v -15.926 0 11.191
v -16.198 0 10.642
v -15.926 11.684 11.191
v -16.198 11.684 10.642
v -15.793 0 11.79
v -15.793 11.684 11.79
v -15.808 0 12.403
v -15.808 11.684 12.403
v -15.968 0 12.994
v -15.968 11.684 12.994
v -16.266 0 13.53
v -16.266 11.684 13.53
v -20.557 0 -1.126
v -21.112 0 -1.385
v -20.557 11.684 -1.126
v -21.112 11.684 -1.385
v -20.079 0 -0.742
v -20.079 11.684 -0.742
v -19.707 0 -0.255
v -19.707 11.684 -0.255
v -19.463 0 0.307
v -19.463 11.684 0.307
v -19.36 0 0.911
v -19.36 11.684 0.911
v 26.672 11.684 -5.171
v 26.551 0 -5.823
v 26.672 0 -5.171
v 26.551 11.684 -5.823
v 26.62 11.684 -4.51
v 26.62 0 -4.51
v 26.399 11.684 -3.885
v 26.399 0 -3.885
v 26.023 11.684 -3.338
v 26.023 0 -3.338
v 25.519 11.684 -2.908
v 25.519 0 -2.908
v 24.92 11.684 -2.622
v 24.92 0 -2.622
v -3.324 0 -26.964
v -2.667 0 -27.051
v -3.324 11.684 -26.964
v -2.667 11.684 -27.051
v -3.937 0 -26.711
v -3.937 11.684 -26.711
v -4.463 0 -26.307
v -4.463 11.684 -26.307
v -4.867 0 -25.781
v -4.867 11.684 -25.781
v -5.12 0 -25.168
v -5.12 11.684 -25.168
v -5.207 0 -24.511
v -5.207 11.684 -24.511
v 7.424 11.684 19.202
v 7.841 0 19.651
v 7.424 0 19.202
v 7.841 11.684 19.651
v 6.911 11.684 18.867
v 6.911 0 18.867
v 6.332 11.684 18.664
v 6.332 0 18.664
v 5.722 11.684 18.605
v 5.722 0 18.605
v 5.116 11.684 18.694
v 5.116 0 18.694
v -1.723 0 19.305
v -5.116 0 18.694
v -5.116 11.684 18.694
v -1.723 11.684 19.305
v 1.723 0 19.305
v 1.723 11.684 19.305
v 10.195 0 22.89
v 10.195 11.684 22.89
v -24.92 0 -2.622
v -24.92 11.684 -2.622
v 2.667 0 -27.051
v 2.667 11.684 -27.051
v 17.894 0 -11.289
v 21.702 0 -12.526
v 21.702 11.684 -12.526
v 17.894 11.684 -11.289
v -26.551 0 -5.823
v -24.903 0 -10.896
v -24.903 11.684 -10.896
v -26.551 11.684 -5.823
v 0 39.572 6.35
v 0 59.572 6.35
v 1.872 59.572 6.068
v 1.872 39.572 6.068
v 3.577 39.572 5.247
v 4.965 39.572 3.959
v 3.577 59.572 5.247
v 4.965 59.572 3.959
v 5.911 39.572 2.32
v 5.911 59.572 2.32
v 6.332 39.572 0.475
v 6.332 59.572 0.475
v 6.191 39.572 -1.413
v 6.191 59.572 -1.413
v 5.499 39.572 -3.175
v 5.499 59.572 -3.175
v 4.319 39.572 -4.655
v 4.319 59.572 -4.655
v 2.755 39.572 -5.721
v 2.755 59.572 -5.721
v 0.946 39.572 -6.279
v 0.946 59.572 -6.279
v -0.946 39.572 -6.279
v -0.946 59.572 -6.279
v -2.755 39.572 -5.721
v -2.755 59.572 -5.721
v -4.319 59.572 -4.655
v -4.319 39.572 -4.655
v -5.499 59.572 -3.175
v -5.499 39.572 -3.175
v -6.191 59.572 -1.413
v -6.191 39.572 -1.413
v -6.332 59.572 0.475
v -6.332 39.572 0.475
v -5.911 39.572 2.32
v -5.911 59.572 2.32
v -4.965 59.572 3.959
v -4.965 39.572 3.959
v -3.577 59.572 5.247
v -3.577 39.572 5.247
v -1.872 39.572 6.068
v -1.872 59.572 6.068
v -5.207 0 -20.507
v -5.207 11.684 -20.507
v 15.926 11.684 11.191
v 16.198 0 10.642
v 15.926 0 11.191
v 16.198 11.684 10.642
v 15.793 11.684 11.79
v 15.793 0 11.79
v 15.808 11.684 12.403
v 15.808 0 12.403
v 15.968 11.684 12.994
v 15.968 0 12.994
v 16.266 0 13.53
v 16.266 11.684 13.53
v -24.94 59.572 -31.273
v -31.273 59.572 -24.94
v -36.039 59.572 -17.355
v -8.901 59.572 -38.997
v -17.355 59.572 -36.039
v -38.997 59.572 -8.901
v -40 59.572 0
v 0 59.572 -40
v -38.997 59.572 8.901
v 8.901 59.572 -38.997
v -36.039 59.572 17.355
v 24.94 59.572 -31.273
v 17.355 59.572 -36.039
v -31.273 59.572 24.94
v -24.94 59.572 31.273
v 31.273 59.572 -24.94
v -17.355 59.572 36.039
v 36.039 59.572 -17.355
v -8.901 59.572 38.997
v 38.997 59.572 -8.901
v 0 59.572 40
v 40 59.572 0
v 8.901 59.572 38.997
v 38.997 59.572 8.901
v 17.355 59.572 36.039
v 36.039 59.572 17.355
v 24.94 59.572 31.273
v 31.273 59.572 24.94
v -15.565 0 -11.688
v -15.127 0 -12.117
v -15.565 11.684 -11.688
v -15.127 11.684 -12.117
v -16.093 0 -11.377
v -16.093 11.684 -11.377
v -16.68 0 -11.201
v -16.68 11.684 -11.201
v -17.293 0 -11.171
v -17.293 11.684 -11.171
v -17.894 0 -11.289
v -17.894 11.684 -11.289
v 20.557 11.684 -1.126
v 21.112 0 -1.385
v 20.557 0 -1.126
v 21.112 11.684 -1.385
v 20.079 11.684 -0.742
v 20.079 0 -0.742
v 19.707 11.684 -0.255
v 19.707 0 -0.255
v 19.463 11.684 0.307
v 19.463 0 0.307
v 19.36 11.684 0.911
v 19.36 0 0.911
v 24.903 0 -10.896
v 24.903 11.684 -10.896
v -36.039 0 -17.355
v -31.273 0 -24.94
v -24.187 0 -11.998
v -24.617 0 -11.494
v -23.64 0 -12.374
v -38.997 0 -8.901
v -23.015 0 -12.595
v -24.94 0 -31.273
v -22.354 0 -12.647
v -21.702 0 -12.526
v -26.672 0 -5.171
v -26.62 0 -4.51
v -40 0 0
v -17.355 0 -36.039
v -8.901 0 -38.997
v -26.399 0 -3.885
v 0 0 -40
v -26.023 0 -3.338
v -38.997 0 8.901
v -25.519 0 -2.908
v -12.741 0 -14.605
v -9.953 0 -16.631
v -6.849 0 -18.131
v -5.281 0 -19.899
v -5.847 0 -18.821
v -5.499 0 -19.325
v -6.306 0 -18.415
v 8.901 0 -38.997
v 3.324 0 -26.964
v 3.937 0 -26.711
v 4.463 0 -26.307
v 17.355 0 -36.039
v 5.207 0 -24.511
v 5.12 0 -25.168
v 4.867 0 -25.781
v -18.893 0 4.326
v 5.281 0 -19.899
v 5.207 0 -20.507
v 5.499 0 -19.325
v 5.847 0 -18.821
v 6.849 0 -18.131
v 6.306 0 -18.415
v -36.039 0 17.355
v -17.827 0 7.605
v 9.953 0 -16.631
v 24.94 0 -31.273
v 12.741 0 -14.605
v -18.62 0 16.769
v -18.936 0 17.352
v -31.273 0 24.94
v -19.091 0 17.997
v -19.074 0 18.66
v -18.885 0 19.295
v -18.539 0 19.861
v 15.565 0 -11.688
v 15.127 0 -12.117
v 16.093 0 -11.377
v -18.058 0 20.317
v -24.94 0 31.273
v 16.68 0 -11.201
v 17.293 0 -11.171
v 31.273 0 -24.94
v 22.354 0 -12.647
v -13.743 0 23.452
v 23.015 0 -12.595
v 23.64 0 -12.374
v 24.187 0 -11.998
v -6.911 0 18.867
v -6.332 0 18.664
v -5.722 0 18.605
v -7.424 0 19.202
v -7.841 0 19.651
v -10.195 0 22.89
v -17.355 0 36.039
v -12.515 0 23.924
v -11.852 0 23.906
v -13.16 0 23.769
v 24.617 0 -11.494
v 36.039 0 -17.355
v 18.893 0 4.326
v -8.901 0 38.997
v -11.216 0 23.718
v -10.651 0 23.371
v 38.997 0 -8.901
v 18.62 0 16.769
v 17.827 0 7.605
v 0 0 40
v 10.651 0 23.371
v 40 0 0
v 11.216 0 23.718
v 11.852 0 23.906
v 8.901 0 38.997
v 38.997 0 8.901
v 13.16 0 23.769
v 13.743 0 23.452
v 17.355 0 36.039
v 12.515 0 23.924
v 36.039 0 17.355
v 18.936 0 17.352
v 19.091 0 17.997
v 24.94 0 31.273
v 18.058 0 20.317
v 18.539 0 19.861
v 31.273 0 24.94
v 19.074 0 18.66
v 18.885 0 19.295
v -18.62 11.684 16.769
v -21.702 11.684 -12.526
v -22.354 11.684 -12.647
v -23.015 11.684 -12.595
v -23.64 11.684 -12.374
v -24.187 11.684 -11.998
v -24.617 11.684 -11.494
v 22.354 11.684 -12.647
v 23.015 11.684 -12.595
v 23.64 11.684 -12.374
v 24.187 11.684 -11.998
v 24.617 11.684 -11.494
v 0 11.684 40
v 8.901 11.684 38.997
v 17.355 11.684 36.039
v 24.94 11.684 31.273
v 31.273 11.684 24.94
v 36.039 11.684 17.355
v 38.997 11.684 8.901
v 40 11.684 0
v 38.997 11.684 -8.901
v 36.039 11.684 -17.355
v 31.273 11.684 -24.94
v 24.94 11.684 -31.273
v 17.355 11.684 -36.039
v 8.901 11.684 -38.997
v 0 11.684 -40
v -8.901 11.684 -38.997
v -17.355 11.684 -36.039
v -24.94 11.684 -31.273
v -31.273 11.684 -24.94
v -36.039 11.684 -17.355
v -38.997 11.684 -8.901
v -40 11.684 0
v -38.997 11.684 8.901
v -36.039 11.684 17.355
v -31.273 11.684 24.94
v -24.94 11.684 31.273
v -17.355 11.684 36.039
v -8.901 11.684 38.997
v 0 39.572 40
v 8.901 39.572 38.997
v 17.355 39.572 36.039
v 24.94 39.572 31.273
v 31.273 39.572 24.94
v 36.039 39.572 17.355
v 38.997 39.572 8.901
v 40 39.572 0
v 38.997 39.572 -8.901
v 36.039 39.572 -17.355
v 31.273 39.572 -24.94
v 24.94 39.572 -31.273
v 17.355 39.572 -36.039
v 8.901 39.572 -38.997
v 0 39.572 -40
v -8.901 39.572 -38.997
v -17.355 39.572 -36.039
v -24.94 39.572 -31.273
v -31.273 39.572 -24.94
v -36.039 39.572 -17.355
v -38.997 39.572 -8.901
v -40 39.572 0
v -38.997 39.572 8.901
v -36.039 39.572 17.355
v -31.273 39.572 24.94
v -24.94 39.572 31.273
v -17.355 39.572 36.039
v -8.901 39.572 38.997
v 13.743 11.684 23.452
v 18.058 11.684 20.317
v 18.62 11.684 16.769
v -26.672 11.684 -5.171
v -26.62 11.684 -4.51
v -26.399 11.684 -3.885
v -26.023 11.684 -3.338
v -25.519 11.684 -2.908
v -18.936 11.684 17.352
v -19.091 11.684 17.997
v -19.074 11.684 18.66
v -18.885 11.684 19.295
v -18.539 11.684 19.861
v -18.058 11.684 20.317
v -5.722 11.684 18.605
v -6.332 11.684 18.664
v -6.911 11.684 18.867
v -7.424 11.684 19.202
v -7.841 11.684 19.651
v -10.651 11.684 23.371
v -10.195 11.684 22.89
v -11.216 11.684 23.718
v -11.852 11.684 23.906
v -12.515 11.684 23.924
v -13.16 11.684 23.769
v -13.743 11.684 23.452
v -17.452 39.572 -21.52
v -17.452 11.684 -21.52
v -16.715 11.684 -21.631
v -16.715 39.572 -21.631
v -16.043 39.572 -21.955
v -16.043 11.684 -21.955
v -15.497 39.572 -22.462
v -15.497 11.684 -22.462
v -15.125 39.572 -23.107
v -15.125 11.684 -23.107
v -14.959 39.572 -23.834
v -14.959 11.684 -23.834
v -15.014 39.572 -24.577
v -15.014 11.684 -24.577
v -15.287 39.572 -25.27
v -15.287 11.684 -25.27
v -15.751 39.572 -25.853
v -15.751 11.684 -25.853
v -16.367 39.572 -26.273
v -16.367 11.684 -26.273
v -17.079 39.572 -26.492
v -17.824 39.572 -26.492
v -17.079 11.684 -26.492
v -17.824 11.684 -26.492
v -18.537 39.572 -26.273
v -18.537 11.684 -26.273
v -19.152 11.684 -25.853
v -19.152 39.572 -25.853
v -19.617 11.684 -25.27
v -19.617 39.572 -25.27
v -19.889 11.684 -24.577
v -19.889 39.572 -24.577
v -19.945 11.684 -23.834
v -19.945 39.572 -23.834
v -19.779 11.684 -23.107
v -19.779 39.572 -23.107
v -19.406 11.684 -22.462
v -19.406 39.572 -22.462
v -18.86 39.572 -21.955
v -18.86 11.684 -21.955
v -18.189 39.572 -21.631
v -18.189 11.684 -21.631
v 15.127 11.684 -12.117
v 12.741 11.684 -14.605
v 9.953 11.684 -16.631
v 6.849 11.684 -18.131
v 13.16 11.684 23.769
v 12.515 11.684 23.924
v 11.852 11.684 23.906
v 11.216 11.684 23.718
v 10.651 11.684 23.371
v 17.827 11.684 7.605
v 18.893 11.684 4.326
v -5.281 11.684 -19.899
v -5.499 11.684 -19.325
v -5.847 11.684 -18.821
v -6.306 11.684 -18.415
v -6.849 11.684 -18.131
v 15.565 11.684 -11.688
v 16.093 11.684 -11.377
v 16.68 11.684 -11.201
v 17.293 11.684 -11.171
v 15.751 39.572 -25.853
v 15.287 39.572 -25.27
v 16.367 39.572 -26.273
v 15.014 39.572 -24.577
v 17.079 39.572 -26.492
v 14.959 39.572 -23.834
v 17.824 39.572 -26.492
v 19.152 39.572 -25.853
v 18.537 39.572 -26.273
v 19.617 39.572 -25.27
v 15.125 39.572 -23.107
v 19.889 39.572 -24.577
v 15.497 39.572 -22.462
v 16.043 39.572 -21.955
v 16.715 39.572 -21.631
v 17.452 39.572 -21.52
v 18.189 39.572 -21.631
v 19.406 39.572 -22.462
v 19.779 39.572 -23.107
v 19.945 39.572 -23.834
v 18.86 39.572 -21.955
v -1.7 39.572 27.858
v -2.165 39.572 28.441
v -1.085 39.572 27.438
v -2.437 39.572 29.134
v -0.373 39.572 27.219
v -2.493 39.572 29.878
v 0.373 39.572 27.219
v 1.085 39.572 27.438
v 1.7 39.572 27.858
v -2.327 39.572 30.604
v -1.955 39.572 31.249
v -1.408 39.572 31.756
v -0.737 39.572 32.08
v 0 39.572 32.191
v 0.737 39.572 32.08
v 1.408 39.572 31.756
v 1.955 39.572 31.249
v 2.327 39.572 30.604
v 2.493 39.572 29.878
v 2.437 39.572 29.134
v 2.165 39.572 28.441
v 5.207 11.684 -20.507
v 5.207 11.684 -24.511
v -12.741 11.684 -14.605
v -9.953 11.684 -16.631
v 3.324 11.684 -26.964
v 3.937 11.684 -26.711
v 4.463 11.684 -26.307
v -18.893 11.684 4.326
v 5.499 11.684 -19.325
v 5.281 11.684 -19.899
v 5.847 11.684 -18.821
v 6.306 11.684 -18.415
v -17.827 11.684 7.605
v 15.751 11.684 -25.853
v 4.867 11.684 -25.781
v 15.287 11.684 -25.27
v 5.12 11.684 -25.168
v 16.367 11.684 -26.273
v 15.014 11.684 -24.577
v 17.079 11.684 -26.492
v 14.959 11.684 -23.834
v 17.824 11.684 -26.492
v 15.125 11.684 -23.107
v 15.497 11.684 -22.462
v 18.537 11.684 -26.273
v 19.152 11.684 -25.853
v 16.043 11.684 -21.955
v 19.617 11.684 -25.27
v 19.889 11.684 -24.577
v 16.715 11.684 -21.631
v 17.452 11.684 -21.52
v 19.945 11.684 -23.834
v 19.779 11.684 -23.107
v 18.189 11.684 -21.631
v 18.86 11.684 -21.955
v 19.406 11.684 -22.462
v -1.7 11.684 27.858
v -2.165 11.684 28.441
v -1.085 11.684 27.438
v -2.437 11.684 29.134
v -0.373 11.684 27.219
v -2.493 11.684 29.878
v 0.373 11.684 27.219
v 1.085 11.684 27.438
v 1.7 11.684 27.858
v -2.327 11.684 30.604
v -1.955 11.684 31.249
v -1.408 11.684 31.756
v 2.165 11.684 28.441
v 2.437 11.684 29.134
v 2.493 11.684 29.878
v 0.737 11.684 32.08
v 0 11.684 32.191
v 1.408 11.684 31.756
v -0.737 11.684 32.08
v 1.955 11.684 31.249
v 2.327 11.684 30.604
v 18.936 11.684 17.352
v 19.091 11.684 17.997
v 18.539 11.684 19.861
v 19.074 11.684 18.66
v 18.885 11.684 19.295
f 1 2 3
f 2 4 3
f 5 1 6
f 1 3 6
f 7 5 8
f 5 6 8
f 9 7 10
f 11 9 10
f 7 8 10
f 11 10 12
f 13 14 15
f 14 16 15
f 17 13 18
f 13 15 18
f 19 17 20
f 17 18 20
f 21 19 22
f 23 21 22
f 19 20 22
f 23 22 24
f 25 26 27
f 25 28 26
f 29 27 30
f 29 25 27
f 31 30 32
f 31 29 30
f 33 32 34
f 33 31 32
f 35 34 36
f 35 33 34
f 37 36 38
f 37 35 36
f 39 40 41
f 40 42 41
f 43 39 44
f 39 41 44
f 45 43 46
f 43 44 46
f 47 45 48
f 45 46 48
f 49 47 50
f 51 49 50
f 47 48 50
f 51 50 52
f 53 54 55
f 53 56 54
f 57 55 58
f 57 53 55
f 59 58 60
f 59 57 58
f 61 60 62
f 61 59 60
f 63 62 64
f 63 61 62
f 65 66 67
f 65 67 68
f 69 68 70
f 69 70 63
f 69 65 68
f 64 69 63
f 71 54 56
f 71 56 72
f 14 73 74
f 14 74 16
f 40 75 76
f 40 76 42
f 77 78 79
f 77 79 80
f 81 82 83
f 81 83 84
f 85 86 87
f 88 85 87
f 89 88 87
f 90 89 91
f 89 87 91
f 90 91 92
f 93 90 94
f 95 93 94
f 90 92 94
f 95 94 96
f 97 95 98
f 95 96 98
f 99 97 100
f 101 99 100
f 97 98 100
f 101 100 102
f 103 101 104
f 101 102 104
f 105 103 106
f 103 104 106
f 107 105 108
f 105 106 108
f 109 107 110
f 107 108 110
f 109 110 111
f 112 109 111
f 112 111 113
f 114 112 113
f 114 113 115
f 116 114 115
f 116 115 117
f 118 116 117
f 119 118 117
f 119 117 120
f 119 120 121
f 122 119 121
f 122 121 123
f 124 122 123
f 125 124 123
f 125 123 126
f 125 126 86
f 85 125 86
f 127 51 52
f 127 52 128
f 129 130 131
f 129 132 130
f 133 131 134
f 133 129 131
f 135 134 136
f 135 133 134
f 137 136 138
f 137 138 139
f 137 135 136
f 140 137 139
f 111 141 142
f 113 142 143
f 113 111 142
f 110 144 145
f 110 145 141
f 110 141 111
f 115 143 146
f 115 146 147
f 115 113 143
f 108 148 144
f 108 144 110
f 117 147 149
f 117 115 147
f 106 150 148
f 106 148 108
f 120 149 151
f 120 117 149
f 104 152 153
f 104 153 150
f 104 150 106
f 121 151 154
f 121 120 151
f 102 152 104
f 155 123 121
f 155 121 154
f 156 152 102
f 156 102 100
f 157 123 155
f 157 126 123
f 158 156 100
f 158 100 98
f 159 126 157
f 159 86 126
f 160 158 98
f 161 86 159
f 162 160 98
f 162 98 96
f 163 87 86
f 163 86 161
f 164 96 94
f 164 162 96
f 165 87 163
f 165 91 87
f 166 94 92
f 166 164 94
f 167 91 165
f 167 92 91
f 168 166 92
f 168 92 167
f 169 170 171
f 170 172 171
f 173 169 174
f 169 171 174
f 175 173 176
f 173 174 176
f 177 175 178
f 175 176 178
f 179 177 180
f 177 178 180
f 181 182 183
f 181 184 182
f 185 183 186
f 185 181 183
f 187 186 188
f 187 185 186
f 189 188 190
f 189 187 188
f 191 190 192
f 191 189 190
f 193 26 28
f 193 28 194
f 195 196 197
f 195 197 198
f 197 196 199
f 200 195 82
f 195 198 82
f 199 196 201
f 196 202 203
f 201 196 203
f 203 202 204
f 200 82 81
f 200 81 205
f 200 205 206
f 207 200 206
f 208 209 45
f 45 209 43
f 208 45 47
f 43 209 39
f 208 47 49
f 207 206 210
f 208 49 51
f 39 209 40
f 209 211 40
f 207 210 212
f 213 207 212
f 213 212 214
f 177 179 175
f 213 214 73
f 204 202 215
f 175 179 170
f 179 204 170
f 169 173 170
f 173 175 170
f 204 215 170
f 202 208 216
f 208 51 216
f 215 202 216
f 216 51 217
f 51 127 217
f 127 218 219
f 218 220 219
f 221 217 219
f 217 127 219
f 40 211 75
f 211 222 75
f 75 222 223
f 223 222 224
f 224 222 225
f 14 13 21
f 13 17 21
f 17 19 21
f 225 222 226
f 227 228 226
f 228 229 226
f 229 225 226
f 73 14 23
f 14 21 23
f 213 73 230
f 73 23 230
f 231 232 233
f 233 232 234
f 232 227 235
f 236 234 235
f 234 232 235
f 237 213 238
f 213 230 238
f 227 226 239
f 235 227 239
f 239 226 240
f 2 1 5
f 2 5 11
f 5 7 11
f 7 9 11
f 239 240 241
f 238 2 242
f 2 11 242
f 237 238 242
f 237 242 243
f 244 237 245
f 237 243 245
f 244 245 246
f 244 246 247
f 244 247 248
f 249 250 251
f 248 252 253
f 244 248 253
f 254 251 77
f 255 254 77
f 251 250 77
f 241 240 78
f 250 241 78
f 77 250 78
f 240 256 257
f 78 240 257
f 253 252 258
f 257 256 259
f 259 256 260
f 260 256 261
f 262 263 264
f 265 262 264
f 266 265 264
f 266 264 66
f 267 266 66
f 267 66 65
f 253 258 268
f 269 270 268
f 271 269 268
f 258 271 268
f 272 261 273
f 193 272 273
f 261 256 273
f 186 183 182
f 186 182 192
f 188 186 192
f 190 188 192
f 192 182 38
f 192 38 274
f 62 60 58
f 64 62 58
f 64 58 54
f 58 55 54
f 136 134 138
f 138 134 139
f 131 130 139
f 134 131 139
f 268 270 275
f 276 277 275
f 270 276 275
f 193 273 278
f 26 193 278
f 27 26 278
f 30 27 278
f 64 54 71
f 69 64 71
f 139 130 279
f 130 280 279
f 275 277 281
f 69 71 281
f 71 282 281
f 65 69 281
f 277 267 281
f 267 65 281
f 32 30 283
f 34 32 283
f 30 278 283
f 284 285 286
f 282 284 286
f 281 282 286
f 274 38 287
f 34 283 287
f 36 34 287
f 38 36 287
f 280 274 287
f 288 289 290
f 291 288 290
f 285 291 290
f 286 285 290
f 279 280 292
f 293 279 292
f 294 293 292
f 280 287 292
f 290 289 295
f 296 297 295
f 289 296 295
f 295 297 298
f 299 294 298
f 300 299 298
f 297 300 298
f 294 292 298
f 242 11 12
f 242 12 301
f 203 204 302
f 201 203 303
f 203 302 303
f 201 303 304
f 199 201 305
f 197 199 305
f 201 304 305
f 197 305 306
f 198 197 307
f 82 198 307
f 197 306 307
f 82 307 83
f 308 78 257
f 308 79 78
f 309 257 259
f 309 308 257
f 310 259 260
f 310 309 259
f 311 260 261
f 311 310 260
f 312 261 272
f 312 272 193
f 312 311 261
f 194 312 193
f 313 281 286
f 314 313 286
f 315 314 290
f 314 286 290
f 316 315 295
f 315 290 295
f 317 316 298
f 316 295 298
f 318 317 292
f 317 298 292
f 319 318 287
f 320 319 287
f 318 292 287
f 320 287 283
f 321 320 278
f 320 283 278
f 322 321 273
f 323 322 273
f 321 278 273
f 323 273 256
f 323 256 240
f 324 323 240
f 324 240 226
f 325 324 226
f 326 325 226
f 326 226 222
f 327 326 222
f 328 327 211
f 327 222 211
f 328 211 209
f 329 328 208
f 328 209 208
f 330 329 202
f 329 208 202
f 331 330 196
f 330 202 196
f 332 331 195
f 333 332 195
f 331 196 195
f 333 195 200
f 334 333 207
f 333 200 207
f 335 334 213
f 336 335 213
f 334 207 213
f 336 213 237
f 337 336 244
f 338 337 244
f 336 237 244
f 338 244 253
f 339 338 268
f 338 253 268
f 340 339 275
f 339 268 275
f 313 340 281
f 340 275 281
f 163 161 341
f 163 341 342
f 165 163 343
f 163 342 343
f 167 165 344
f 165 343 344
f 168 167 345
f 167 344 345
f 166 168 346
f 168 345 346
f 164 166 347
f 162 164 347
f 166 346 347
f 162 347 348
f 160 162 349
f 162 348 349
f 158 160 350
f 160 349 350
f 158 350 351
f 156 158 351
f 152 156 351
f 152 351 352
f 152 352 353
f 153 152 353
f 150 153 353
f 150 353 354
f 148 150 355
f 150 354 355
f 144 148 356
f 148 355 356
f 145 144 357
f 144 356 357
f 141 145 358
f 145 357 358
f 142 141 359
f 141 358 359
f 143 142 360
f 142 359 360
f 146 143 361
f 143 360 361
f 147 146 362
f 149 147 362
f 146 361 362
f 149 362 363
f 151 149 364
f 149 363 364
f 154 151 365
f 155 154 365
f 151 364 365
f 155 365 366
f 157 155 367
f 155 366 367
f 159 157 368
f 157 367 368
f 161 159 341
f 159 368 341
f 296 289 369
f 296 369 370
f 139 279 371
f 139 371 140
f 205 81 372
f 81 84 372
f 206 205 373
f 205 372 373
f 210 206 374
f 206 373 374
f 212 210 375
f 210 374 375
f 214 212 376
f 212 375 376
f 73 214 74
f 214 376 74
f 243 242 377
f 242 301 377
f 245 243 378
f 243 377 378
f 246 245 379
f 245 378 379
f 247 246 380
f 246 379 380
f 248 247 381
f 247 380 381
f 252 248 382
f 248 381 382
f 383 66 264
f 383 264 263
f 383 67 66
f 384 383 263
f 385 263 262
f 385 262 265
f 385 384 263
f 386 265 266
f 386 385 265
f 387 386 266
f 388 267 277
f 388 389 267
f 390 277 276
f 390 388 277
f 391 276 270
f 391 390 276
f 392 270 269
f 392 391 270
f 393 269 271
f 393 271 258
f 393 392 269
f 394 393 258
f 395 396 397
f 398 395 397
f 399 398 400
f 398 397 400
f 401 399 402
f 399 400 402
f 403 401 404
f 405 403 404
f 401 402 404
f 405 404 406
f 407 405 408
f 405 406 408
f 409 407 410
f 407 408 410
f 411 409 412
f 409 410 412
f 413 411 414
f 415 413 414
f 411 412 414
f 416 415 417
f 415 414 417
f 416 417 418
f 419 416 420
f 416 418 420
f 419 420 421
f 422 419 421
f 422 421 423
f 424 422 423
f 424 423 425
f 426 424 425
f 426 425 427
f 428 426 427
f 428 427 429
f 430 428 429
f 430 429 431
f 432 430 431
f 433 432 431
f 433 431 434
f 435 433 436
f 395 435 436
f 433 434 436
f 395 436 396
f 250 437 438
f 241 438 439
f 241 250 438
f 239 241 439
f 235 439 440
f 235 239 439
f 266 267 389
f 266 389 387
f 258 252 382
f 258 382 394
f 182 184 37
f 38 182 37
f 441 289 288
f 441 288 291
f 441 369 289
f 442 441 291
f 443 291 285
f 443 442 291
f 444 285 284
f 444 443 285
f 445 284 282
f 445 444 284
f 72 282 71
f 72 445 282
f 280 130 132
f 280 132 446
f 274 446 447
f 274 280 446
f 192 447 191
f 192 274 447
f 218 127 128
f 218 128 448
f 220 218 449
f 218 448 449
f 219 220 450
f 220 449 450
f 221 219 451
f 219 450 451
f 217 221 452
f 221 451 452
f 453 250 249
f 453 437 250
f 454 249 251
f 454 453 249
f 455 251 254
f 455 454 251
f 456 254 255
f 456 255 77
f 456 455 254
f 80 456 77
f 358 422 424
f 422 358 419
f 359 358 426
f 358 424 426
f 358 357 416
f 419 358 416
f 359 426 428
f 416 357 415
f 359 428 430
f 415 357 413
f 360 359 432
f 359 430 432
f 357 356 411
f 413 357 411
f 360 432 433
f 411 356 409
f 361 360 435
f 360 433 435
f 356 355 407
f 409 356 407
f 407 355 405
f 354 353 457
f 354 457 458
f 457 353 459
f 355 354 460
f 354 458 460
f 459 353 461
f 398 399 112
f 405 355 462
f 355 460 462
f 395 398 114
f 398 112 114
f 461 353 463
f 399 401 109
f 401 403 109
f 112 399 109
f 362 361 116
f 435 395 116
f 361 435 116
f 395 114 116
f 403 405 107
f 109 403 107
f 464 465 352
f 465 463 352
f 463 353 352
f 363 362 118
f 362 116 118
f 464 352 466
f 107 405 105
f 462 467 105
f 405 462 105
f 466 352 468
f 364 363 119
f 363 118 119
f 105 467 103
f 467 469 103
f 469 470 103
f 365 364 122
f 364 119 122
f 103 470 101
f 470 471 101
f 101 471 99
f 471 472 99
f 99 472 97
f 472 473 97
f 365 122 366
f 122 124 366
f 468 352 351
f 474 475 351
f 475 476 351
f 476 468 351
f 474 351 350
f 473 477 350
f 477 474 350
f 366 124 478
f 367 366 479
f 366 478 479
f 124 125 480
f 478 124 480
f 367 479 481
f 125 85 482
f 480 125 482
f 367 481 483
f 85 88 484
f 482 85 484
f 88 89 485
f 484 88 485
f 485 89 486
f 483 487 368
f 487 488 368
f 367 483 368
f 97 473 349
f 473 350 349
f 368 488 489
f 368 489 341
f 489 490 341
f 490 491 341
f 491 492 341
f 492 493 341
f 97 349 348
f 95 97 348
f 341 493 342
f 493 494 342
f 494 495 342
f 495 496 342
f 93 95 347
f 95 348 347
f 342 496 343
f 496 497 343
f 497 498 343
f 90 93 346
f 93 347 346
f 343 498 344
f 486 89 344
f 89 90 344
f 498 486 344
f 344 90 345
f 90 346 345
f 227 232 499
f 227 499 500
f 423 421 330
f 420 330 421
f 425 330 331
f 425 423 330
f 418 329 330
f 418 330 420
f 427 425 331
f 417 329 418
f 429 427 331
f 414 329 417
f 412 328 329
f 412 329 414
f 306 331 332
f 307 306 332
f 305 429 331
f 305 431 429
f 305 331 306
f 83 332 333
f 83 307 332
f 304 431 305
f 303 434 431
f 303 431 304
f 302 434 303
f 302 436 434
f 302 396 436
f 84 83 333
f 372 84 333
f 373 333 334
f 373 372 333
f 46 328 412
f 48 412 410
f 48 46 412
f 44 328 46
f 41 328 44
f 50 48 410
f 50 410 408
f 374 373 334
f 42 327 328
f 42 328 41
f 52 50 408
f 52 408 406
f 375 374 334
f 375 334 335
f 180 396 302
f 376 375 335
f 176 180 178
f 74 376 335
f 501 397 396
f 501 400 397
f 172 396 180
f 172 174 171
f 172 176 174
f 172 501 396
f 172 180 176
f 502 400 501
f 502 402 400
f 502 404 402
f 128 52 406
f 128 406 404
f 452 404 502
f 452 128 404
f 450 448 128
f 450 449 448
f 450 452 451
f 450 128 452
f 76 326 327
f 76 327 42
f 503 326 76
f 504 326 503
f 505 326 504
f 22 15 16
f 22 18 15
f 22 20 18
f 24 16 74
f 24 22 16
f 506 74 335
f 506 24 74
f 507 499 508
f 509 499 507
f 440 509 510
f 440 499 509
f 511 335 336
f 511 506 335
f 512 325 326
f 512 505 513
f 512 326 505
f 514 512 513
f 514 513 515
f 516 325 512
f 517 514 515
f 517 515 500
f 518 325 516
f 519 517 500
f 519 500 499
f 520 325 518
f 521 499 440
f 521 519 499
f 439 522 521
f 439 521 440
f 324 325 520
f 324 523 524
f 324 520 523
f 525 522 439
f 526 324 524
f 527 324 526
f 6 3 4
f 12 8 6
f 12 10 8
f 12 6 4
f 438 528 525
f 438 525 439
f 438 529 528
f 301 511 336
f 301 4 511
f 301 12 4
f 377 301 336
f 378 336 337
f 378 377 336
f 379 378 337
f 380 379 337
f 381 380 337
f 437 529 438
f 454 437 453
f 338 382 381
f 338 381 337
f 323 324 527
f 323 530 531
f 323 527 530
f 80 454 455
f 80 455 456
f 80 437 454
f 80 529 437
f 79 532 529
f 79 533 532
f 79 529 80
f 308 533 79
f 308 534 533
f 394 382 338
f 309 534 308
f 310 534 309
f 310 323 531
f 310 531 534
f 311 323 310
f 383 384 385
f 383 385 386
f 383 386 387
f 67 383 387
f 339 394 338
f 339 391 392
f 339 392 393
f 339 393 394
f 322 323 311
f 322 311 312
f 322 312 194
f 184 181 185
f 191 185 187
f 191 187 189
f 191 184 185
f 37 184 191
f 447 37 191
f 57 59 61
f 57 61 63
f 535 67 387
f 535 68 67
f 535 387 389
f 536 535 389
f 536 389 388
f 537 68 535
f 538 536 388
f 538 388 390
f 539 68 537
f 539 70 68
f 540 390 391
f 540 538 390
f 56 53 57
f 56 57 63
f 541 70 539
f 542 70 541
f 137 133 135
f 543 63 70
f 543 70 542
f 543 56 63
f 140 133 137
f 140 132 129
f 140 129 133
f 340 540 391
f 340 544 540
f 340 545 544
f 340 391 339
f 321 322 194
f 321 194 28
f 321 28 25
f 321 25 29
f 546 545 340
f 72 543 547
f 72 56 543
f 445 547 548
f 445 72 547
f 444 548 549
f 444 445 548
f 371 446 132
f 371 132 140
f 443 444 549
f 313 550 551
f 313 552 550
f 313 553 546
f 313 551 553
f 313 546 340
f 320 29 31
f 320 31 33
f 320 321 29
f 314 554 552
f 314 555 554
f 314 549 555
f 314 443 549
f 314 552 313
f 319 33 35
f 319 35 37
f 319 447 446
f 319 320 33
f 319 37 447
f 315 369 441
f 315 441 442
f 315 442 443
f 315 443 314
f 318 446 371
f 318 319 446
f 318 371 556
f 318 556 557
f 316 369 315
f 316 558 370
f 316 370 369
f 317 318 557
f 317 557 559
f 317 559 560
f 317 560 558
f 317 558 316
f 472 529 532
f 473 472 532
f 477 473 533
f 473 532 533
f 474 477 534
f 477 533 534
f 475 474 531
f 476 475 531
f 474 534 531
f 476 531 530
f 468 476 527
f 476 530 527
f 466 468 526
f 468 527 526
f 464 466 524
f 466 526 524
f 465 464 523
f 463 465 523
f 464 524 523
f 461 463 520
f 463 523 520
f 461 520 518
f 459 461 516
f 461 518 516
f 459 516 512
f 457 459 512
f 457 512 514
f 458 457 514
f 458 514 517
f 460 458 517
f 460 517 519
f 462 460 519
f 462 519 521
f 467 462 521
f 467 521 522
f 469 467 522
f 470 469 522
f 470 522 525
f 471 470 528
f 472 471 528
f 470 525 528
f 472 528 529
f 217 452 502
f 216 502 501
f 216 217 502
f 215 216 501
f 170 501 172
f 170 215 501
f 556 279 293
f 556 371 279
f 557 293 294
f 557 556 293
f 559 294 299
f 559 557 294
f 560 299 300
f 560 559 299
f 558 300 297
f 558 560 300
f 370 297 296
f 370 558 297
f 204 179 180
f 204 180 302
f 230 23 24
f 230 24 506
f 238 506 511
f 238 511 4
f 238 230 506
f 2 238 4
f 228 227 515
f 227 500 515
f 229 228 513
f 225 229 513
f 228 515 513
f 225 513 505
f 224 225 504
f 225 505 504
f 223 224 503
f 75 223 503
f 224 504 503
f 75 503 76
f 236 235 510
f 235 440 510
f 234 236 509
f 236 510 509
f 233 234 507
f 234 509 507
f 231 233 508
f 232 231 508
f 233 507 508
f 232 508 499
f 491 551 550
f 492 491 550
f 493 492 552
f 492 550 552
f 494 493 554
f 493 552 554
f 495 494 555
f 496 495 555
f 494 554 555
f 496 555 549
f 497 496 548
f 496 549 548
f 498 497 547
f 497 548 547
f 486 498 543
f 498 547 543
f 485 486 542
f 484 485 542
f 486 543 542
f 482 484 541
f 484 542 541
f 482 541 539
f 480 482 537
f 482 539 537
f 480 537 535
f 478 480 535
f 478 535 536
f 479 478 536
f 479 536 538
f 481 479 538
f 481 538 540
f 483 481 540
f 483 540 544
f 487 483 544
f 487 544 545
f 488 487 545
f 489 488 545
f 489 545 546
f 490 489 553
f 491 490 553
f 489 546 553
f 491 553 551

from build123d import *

# Parameters (mm, degrees)
SKETCH1_R           = 40
BOSS_EXTRUDE1_DEPTH = 11.684
SKETCH2_R           = 2.5
BOSS_EXTRUDE2_DEPTH = 27.888000104
SKETCH3_R           = 40
BOSS_EXTRUDE3_DEPTH = 20
FILLET1_R           = 2.54
CUT_EXTRUDE1_REACH  = 84.151
SKETCH4_R           = 6.35


with BuildPart() as part:
    # Sketch1 → Boss-Extrude1 (new body)
    with BuildSketch(Plane(origin=(0, 0, 0), x_dir=(1, 0, 0), z_dir=(0, 1, 0))):
        with Locations(Location((0, 0, 0), (0, 0, 270))):
            Circle(SKETCH1_R)
        with BuildLine():
            ThreePointArc((16.146222613, 10.721189548), (11.392188189, 15.680001858), (5.207, 18.669))
            Line((5.207, 18.669), (5.207, 27.051))
            Line((5.207, 27.051), (-5.207, 27.051))
            Line((-5.207, 27.051), (-5.207, 18.669))
            ThreePointArc((-5.207, 18.669), (-11.392188189, 15.680001858), (-16.146222613, 10.721189548))
            Line((-16.146222613, 10.721189548), (-24.117978333, 13.311369995))
            Line((-24.117978333, 13.311369995), (-27.336081312, 3.407067434))
            Line((-27.336081312, 3.407067434), (-19.364325592, 0.816886988))
            ThreePointArc((-19.364325592, 0.816886988), (-18.432947696, -5.989227766), (-15.185914365, -12.042940459))
            Line((-15.185914365, -12.042940459), (-20.112730349, -18.824120906))
            Line((-20.112730349, -18.824120906), (-11.68762737, -24.945316524))
            Line((-11.68762737, -24.945316524), (-6.760811385, -18.164136077))
            ThreePointArc((-6.760811385, -18.164136077), (0, -19.381548184), (6.760811385, -18.164136077))
            Line((6.760811385, -18.164136077), (11.68762737, -24.945316524))
            Line((11.68762737, -24.945316524), (20.112730349, -18.824120906))
            Line((20.112730349, -18.824120906), (15.185914365, -12.042940459))
            ThreePointArc((15.185914365, -12.042940459), (18.432947696, -5.989227766), (19.364325592, 0.816886988))
            Line((19.364325592, 0.816886988), (27.336081312, 3.407067434))
            Line((27.336081312, 3.407067434), (24.117978333, 13.311369995))
            Line((24.117978333, 13.311369995), (16.146222613, 10.721189548))
        make_face(mode=Mode.SUBTRACT)
    extrude(amount=BOSS_EXTRUDE1_DEPTH)

    # Sketch2 → Boss-Extrude2 (add)
    with BuildSketch(Plane(origin=(0, 11.684, 0), x_dir=(1, 0, 0), z_dir=(0, 1, 0))):
        with Locations(Location((-17.45179914, 24.020340816, 0), (0, 0, 270))):
            Circle(SKETCH2_R)
        with Locations(Location((17.45179914, 24.020340816, 0), (0, 0, 270))):
            Circle(SKETCH2_R)
        with Locations(Location((0, -29.690774092, 0), (0, 0, 270))):
            Circle(SKETCH2_R)
    extrude(amount=BOSS_EXTRUDE2_DEPTH)

    # Sketch3 → Boss-Extrude3 (add)
    with BuildSketch(Plane(origin=(0, 39.572000104, 0), x_dir=(1, 0, 0), z_dir=(0, 1, 0))):
        with Locations(Location((0, 0, 0), (0, 0, 270))):
            Circle(SKETCH3_R)
    extrude(amount=BOSS_EXTRUDE3_DEPTH)

    # Fillet1
    fillet1_edges = [part.edges().sort_by_distance(p)[0] for p in [
        (5.207, 5.842, -18.669),
        (5.207, 5.842, -27.051),
        (-5.207, 5.842, -27.051),
        (-5.207, 5.842, -18.669),
        (-16.146222613, 5.842, -10.721189548),
        (-24.117978333, 5.842, -13.311369995),
        (-27.336081312, 5.842, -3.407067434),
        (-19.364325592, 5.842, -0.816886988),
        (-15.185914365, 5.842, 12.042940459),
        (-20.112730349, 5.842, 18.824120906),
        (-11.68762737, 5.842, 24.945316524),
        (-6.760811385, 5.842, 18.164136077),
        (6.760811385, 5.842, 18.164136077),
        (11.68762737, 5.842, 24.945316524),
        (20.112730349, 5.842, 18.824120906),
        (15.185914365, 5.842, 12.042940459),
        (19.364325592, 5.842, -0.816886988),
        (27.336081312, 5.842, -3.407067434),
        (24.117978333, 5.842, -13.311369995),
        (16.146222613, 5.842, -10.721189548),
    ]]
    fillet(fillet1_edges, radius=FILLET1_R)

    # Sketch4 → Cut-Extrude1 (cut, up to next)
    with BuildSketch(Plane(origin=(0, 59.572000104, 0), x_dir=(1, 0, 0), z_dir=(0, 1, 0)), mode=Mode.PRIVATE) as cut_extrude1_sk1:
        with Locations(Location((0, 0, 0), (0, 0, 270))):
            Circle(SKETCH4_R)
    cut_extrude1_tool1 = extrude(cut_extrude1_sk1.sketch, amount=-CUT_EXTRUDE1_REACH, mode=Mode.PRIVATE) & part.part
    add(cut_extrude1_tool1.solids().sort_by_distance((0, 59.572, 0))[0], mode=Mode.SUBTRACT)


solid = part.part
